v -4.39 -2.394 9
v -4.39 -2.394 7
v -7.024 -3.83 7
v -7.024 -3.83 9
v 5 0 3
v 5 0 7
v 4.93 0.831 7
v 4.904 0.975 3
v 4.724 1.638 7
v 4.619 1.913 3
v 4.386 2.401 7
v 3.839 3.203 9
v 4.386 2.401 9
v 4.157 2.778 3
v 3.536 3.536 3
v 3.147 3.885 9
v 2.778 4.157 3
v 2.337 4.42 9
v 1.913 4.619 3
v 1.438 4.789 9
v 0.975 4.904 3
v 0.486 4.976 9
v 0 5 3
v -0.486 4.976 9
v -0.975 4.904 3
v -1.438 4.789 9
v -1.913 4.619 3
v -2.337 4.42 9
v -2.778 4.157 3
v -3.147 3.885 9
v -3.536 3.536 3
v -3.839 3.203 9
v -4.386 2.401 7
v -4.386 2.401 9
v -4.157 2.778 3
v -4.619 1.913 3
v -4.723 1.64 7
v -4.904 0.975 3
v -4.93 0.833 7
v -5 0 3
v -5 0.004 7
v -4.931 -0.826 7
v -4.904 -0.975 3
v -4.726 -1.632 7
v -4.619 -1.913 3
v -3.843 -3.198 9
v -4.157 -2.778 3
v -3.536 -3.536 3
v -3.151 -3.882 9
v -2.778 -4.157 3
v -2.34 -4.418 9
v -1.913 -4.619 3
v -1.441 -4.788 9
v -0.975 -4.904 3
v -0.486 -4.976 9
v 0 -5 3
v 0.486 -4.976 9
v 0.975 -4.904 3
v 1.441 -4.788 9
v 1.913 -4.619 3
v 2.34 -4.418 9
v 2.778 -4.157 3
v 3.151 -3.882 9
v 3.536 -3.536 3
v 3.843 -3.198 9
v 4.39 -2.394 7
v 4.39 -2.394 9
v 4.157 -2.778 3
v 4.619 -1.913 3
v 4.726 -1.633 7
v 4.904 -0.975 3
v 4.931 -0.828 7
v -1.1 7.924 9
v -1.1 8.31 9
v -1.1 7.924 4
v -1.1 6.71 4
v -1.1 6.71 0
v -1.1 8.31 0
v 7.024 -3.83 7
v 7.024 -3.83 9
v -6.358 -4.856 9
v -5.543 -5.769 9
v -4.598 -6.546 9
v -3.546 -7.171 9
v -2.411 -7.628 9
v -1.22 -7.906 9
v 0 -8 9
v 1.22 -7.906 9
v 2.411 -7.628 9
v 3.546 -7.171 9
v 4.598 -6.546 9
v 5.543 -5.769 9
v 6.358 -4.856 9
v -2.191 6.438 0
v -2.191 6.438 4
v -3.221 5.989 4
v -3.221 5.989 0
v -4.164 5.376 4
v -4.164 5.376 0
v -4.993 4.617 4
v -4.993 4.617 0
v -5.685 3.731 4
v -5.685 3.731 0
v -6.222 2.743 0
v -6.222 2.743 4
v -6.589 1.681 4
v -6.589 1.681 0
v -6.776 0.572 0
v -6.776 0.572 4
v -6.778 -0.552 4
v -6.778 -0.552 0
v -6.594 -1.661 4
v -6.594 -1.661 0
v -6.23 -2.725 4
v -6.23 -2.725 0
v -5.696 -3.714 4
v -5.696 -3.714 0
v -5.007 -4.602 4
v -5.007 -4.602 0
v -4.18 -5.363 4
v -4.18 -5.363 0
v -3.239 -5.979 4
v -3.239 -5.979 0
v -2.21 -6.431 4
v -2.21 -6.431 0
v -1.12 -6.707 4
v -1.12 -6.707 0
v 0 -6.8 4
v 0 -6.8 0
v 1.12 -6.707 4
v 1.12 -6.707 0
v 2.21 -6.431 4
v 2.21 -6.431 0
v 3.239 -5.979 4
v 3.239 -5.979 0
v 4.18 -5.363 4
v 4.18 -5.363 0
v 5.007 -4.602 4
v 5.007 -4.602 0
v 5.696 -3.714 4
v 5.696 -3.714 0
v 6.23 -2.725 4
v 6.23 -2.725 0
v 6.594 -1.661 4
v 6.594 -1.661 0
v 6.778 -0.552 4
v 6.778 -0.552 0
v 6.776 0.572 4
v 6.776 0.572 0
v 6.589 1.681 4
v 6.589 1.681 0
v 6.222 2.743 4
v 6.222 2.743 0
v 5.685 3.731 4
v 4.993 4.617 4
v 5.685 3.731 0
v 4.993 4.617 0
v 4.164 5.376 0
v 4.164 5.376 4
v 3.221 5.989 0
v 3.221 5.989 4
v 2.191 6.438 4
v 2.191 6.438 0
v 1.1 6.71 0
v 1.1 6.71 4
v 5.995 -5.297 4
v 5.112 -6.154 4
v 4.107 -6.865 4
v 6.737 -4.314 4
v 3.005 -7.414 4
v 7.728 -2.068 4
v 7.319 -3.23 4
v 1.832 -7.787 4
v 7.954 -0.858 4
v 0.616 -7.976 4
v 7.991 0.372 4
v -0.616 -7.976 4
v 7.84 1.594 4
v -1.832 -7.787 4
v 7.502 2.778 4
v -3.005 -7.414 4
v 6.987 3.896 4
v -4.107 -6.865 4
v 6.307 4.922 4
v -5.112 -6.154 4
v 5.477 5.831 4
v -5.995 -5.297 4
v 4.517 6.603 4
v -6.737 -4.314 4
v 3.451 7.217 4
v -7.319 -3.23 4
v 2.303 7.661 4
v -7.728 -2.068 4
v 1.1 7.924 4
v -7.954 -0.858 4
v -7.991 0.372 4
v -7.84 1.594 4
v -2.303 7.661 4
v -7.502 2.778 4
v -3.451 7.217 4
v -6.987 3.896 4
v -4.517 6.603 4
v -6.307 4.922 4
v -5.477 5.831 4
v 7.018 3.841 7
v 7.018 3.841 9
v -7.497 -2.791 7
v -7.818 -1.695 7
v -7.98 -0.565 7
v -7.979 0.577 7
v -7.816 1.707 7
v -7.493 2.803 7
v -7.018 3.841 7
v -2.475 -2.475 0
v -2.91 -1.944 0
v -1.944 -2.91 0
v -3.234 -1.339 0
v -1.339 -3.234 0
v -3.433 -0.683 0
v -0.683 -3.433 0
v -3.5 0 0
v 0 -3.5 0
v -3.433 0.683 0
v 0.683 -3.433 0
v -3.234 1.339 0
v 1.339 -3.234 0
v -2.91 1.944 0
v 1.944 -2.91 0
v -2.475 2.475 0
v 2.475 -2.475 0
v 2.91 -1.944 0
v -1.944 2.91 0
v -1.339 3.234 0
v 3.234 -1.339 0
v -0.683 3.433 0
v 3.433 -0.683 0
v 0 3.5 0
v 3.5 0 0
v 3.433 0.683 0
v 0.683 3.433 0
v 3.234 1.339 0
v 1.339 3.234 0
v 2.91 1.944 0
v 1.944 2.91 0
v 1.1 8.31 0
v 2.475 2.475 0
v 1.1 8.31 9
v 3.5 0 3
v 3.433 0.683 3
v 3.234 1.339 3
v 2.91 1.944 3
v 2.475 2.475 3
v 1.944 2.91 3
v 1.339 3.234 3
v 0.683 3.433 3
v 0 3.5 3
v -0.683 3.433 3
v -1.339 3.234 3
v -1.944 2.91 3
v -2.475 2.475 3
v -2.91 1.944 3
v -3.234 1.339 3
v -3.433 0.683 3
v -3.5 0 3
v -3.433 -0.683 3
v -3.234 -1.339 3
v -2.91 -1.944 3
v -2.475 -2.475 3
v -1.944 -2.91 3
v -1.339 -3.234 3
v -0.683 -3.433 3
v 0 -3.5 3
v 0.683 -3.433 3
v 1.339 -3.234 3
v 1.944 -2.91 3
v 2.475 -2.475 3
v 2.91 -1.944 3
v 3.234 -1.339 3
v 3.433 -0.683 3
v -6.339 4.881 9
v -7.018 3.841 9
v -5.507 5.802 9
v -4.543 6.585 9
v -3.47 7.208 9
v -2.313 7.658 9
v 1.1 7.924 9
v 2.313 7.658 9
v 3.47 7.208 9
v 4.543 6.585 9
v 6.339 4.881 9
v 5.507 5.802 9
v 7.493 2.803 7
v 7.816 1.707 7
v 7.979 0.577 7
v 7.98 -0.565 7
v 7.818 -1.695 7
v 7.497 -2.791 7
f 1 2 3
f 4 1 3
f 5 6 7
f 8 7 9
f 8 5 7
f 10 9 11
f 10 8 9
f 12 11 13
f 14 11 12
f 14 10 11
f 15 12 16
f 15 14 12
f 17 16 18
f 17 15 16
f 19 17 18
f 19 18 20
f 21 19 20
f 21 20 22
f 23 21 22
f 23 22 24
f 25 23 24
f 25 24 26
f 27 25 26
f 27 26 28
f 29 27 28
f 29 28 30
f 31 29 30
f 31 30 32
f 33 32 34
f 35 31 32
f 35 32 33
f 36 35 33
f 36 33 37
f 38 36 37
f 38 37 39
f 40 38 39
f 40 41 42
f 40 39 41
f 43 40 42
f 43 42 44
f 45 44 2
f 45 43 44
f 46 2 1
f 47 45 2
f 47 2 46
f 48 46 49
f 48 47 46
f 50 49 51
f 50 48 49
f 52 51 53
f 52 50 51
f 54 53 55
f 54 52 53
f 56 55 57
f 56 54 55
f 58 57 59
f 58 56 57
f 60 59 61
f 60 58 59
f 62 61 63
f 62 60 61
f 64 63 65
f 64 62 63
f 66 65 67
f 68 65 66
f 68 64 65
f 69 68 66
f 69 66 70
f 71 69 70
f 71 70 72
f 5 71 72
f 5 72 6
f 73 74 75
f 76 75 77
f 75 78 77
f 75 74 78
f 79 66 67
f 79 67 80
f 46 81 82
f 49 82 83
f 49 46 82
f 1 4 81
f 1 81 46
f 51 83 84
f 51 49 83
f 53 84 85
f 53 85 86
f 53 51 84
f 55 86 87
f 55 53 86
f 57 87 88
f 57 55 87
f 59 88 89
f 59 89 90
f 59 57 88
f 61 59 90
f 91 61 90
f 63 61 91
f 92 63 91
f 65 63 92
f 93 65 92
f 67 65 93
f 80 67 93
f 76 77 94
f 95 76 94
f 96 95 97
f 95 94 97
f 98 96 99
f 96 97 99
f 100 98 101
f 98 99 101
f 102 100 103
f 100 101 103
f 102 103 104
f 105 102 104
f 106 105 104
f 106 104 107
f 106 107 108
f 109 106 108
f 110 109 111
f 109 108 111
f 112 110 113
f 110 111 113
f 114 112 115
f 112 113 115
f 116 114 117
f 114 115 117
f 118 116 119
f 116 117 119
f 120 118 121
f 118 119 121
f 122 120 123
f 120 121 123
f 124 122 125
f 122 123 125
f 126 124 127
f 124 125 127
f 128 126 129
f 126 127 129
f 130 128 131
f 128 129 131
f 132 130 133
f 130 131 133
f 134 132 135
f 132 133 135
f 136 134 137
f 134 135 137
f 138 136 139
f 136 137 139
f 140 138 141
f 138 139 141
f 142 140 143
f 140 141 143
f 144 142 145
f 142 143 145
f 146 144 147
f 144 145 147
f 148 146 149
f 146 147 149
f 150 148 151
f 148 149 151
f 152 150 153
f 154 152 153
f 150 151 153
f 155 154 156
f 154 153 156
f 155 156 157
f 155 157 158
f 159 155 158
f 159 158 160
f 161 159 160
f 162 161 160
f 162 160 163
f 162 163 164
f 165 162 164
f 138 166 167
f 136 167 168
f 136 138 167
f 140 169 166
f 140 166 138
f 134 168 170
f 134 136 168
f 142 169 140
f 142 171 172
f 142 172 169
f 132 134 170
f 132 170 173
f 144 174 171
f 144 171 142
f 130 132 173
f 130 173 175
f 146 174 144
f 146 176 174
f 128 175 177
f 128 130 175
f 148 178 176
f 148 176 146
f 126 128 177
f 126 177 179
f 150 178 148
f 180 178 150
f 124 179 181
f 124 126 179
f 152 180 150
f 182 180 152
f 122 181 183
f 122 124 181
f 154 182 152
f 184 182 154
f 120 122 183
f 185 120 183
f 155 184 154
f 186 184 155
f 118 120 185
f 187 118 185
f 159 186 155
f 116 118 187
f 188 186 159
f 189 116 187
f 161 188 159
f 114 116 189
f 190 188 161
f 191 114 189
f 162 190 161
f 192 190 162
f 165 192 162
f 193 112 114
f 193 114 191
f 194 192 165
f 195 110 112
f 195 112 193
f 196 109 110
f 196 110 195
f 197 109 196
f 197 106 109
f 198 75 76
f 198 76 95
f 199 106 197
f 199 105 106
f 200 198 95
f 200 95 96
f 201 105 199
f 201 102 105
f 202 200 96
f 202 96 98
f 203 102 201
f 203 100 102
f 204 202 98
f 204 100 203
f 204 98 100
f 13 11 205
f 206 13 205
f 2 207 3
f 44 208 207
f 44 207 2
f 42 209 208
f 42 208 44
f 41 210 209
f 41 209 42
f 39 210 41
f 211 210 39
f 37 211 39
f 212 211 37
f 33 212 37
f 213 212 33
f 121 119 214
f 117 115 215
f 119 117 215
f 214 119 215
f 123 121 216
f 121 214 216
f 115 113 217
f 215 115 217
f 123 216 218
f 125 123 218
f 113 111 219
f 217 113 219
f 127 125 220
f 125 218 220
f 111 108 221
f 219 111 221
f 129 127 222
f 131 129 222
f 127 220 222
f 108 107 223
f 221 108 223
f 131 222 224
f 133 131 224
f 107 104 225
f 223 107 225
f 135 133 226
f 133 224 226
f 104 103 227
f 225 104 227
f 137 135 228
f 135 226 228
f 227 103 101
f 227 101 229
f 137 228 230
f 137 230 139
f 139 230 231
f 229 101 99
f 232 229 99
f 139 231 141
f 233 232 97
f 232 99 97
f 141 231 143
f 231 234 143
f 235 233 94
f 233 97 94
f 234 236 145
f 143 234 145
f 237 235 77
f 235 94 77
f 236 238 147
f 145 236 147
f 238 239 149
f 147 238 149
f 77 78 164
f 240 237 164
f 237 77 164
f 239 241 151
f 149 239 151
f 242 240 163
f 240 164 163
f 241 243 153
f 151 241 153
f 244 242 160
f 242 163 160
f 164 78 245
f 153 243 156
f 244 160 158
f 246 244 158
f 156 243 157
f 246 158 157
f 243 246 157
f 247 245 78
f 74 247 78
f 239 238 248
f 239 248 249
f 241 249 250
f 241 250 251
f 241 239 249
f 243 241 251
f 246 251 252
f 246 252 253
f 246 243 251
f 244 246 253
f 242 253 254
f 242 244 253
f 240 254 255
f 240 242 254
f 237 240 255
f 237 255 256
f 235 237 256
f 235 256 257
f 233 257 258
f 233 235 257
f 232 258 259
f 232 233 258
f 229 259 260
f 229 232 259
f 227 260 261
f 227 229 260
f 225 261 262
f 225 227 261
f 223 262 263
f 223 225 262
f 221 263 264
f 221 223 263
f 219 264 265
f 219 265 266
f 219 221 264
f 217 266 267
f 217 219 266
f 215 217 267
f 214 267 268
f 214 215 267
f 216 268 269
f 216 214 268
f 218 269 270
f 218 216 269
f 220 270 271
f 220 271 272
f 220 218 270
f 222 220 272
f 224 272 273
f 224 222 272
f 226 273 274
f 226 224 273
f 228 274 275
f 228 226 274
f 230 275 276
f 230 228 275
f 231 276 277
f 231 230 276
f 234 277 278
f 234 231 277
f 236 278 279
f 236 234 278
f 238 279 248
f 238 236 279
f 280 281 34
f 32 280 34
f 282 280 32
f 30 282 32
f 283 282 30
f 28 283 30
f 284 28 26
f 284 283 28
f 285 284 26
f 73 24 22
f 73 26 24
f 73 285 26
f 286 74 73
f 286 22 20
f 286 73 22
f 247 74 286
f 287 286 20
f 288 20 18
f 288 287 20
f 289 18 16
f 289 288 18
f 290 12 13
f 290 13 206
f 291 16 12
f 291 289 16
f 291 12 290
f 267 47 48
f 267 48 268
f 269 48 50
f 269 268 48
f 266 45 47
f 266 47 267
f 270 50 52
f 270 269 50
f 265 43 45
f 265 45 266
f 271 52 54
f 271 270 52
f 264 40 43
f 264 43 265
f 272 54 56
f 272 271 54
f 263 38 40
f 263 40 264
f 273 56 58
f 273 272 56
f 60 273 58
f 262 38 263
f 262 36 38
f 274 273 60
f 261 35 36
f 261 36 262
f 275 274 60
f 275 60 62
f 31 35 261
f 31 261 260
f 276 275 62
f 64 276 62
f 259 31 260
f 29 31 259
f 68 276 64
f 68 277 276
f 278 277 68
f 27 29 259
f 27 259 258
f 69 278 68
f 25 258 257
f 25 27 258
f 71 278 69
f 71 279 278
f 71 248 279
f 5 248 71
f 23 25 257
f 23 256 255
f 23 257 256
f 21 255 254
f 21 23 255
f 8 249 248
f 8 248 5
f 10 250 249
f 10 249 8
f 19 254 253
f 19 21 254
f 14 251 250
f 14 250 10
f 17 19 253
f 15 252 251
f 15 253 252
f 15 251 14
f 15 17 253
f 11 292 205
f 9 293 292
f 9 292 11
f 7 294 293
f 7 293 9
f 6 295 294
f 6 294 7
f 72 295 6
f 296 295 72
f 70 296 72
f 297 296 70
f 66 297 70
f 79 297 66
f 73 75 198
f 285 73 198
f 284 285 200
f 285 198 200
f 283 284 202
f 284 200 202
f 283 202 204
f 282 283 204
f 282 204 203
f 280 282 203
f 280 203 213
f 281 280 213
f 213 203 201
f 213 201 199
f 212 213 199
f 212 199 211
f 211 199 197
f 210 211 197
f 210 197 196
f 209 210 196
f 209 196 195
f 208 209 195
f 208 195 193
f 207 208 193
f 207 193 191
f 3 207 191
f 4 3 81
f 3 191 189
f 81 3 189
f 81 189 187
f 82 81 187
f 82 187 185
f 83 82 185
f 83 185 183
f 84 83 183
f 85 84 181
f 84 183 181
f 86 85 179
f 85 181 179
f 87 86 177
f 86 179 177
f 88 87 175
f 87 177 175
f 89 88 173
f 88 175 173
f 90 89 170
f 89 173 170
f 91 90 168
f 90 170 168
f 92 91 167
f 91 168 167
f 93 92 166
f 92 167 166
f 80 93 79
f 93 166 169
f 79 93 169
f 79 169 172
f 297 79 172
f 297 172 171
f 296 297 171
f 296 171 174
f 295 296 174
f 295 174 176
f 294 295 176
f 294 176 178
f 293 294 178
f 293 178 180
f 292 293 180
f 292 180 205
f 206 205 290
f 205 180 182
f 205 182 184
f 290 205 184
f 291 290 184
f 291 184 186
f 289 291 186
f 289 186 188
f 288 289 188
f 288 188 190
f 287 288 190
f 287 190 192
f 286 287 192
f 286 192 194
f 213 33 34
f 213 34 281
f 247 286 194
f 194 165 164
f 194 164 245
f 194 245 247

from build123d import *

# Parameters (mm, degrees)
SKETCH1_R                = 8
SKETCH1_R_2              = 3.5
BOSS_EXTRUDE1_DEPTH      = 3
SKETCH2_R                = 8
SKETCH2_R_2              = 5
BOSS_EXTRUDE2_DEPTH      = 6
WRAP3_SECTION_W          = 4
WRAP3_SECTION_H          = 2
WRAP3_ANGLE              = 57.295779513
WRAP3_SECTOR_2_SECTION_W = 4
WRAP3_SECTOR_2_SECTION_H = 2
WRAP3_SECTOR_2_ANGLE     = 57.295779513
CUT_EXTRUDE1_DEPTH       = 4
BOSS_EXTRUDE3_DEPTH      = 9


with BuildPart() as part:
    # Sketch1 → Boss-Extrude1 (new body)
    with BuildSketch(Plane.XY):
        Circle(SKETCH1_R)
        Circle(SKETCH1_R_2, mode=Mode.SUBTRACT)
    extrude(amount=BOSS_EXTRUDE1_DEPTH)

    # Sketch2 → Boss-Extrude2 (add)
    with BuildSketch(Plane.XY.offset(3)):
        Circle(SKETCH2_R)
        Circle(SKETCH2_R_2, mode=Mode.SUBTRACT)
    extrude(amount=BOSS_EXTRUDE2_DEPTH)

    # Wrap3 section (on wrap section) → Wrap3 (revolve, cut)
    with BuildSketch(Plane(origin=(0, 0, 0), x_dir=(-0.8779640629990781, -0.4787265441587198, 0), z_dir=(0.4787265441587198, -0.8779640629990781, 0))):
        with Locations((6, -8)):
            Rectangle(WRAP3_SECTION_W, WRAP3_SECTION_H)
    revolve(axis=Axis((0, 0, 0), (0, 0, -1)), revolution_arc=WRAP3_ANGLE, mode=Mode.SUBTRACT)

    # Wrap3 sector 2 section (on wrap section) → Wrap3 sector 2 (revolve, cut)
    with BuildSketch(Plane(origin=(0, 0, 0), x_dir=(0.8772005042746819, 0.4801242290285337, 0), z_dir=(-0.4801242290285337, 0.8772005042746819, 0))):
        with Locations((6, -8)):
            Rectangle(WRAP3_SECTOR_2_SECTION_W, WRAP3_SECTOR_2_SECTION_H)
    revolve(axis=Axis((0, 0, 0), (0, 0, -1)), revolution_arc=WRAP3_SECTOR_2_ANGLE, mode=Mode.SUBTRACT)

    # Sketch5 → Cut-Extrude1 (cut)
    with BuildSketch(Plane(origin=(0, 0, 0), x_dir=(-1, 0, 0), z_dir=(0, 0, -1))):
        with BuildLine():
            Line((-1.1, 6.710439628), (-1.1, 7.924014134))
            ThreePointArc((-1.1, 7.924014134), (0, -8), (1.1, 7.924014134))
            Line((1.1, 7.924014134), (1.1, 6.710439628))
            ThreePointArc((1.1, 6.710439628), (0, -6.8), (-1.1, 6.710439628))
        make_face()
    extrude(amount=-CUT_EXTRUDE1_DEPTH, mode=Mode.SUBTRACT)

    # Sketch6 → Boss-Extrude3 (add)
    with BuildSketch(Plane(origin=(0, 0, 0), x_dir=(-1, 0, 0), z_dir=(0, 0, -1))):
        with BuildLine():
            Line((-1.1, 7.731159285), (-1.1, 8.310439628))
            Line((-1.1, 8.310439628), (1.1, 8.310439628))
            Line((1.1, 8.310439628), (1.1, 7.731159285))
            ThreePointArc((1.1, 7.731159285), (0, 7.807145151), (-1.1, 7.731159285))
        make_face()
    extrude(amount=-BOSS_EXTRUDE3_DEPTH)


solid = part.part
